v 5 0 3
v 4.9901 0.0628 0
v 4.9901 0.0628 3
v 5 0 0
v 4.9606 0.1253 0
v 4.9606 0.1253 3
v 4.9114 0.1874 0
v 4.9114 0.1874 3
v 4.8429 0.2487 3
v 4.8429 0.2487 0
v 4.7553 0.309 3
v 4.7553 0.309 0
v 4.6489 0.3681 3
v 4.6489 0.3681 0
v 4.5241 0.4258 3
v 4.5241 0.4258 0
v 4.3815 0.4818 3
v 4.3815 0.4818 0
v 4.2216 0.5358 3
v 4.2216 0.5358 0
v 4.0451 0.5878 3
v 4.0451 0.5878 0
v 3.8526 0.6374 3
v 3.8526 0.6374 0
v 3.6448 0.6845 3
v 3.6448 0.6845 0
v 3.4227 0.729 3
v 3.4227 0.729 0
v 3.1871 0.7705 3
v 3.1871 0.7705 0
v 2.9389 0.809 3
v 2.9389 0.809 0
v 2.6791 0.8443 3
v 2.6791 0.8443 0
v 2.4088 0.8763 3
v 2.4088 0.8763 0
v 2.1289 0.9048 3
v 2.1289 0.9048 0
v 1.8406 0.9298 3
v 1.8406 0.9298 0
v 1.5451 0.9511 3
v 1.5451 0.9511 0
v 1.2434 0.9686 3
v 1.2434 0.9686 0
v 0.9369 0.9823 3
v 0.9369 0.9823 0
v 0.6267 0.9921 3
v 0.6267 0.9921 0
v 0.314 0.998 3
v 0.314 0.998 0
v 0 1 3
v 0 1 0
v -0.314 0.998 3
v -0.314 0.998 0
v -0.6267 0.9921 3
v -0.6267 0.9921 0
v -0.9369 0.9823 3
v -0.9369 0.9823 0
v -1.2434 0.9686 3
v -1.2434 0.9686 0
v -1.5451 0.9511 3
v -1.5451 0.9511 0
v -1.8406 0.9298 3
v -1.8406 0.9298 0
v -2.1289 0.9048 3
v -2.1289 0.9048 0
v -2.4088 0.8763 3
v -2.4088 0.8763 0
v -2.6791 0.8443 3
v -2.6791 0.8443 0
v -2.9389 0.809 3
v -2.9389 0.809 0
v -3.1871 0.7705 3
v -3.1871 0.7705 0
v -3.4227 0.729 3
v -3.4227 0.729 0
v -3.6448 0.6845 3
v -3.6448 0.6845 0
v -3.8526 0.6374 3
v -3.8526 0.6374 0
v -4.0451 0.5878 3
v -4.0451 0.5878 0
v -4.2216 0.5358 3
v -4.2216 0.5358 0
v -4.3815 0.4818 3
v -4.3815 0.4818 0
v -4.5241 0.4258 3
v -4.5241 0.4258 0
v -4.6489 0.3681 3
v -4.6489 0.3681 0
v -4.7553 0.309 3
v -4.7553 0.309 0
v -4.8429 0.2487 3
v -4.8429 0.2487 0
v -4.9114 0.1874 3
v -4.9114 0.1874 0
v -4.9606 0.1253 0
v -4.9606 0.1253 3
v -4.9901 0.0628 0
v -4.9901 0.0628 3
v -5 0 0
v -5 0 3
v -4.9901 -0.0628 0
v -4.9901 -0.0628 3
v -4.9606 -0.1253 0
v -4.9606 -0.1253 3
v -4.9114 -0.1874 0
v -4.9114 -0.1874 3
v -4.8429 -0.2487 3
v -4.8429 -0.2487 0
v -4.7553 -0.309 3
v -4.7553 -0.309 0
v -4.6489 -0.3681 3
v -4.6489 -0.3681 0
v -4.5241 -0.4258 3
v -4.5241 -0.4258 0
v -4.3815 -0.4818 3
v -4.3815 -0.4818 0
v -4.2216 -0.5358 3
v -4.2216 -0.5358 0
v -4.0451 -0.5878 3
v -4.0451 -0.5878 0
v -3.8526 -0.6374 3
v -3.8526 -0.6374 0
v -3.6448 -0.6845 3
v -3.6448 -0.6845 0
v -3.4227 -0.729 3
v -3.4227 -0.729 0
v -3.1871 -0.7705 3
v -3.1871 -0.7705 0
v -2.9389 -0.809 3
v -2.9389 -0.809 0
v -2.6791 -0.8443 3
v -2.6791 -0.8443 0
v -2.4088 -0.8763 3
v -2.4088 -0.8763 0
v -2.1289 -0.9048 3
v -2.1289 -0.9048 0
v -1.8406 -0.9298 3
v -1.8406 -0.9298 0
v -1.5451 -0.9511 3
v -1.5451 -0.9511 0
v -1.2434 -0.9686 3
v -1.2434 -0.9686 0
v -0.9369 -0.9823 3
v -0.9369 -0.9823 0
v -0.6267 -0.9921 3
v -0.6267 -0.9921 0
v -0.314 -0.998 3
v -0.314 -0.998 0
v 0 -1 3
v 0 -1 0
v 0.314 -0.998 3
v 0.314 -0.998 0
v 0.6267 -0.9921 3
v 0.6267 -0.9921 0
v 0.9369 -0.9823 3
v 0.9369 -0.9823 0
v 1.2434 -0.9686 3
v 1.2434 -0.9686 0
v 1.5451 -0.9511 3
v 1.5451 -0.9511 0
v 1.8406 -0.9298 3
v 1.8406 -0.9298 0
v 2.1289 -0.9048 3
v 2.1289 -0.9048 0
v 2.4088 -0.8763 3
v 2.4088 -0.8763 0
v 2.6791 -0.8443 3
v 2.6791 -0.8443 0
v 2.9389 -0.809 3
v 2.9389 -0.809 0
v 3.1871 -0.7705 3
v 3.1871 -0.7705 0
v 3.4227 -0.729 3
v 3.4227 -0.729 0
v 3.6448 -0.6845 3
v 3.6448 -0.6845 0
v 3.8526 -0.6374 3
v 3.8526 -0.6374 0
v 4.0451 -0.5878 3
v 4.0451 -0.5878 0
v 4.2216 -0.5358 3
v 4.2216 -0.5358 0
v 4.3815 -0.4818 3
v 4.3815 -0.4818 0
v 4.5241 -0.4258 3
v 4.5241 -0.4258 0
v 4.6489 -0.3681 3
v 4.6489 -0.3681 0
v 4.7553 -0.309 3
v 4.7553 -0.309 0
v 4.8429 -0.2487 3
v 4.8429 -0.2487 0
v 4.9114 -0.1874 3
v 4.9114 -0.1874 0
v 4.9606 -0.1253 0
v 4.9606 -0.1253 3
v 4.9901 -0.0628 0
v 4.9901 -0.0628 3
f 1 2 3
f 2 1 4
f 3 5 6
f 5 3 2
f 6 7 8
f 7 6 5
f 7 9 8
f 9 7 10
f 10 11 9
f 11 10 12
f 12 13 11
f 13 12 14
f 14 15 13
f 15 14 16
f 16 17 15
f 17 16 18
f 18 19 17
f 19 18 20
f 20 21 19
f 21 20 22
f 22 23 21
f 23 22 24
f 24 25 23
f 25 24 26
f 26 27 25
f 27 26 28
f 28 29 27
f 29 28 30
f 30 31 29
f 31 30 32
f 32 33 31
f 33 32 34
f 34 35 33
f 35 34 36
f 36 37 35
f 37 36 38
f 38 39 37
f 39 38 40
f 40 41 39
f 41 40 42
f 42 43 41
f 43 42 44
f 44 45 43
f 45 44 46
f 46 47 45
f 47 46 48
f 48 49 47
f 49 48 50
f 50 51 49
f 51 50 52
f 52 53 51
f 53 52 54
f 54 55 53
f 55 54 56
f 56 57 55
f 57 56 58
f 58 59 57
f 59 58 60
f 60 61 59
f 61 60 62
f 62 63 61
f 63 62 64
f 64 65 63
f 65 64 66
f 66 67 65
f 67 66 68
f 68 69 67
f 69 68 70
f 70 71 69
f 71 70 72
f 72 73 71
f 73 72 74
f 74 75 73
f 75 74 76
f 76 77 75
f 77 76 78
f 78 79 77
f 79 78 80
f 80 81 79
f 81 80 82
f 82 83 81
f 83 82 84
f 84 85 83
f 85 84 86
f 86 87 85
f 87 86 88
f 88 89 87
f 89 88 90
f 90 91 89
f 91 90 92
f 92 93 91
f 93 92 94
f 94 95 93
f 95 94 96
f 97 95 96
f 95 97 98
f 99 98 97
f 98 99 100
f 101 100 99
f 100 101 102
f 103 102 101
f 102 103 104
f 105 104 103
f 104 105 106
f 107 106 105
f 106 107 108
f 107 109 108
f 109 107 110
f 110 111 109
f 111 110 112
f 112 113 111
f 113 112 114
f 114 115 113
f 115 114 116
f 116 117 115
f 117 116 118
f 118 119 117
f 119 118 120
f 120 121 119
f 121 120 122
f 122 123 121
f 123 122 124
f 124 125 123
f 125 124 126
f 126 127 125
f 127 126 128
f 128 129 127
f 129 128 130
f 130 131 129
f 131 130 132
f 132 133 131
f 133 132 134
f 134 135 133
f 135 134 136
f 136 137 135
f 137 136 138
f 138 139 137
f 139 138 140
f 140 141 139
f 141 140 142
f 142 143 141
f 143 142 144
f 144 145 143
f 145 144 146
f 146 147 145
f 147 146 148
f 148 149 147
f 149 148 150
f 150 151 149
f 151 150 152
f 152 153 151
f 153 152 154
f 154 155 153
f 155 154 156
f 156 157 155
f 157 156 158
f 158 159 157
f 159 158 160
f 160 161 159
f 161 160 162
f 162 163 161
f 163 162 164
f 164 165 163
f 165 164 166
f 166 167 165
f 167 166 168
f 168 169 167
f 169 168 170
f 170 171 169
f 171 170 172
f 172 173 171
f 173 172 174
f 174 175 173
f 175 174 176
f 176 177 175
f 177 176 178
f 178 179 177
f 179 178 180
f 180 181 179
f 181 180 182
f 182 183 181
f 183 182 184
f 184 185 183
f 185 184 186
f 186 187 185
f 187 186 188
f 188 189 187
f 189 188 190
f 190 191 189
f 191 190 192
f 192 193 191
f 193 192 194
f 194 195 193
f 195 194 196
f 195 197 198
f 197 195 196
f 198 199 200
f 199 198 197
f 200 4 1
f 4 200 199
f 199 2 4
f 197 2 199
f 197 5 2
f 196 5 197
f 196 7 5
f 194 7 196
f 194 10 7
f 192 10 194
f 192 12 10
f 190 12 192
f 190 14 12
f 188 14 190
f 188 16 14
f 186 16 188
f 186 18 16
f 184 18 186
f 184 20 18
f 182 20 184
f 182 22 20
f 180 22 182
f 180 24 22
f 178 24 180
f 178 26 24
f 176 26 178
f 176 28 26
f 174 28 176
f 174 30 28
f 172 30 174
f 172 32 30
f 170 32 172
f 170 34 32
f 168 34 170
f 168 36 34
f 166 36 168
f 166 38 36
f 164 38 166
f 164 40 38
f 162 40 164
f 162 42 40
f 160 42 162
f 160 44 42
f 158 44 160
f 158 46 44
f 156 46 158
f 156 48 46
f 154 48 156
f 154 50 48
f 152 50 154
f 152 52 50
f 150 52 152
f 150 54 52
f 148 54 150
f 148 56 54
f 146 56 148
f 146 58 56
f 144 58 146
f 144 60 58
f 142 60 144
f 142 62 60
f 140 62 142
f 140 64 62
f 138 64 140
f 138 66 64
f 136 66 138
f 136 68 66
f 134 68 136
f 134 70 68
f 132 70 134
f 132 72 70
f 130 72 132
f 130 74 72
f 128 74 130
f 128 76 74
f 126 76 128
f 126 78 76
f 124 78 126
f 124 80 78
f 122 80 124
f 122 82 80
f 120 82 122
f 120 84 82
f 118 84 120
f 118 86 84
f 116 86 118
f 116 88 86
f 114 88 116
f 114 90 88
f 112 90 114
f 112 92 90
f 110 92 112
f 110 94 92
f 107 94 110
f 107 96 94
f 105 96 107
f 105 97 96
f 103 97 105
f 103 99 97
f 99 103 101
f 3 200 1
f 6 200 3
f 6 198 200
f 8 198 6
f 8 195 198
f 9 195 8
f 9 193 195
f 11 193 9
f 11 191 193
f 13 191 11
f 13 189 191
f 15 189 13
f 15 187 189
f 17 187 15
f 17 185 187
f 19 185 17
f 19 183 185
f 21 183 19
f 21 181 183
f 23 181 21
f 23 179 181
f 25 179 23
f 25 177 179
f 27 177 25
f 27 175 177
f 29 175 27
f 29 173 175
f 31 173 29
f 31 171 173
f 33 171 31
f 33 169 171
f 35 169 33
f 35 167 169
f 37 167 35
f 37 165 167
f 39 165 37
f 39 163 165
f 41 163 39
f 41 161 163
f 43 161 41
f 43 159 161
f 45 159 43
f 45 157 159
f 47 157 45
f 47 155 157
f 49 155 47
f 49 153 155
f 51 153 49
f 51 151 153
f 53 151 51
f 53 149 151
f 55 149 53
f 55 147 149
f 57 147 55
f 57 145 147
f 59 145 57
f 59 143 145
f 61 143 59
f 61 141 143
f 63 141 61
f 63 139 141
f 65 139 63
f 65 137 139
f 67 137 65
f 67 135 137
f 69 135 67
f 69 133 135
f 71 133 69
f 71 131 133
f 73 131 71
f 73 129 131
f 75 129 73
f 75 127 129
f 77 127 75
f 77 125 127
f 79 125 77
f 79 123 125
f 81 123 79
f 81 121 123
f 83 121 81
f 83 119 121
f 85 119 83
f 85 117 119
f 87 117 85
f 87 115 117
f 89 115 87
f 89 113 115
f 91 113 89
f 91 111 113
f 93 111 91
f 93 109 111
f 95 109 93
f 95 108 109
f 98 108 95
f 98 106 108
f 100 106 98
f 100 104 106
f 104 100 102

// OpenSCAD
// Generated by Mecha (https://github.com/tomahawkins/mecha)

color([0.5, 0.5, 0.5, 1.0]) scale ([5.0, 1.0, 1.0]) cylinder(h = 3.0, r1 = 1.0, r2 = 1.0, center = false, $fn = 100);
